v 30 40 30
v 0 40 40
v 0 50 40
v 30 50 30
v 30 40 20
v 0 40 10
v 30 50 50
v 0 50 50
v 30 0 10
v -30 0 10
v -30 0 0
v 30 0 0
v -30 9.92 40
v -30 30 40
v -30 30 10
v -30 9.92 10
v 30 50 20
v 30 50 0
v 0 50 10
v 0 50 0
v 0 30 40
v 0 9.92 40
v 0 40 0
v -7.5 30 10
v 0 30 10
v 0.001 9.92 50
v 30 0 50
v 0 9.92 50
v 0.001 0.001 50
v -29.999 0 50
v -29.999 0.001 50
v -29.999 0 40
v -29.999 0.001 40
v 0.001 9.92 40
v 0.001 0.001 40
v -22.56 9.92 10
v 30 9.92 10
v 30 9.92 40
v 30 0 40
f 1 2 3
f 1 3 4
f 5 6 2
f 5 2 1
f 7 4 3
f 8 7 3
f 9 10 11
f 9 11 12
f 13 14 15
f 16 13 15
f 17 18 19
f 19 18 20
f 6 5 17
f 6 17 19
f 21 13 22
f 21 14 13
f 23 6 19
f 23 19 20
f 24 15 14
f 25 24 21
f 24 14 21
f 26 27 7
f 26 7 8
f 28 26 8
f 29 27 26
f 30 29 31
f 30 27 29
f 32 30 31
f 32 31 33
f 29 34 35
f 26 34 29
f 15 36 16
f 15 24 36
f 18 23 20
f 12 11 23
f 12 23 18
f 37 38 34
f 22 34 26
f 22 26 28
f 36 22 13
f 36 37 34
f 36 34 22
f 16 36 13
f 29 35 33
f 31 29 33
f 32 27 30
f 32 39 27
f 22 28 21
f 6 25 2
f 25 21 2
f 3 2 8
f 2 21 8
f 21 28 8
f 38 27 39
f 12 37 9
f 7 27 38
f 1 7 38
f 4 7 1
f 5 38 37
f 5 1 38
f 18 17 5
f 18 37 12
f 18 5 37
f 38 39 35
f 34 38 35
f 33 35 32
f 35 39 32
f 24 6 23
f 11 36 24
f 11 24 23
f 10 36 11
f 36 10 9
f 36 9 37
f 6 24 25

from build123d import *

# Parameters (mm, degrees)
SKETCH1_W               = 30
SKETCH1_H               = 50
BOSS_EXTRUDE1_DEPTH     = 50
SKETCH2_W               = 30
SKETCH2_H               = 20
BOSS_EXTRUDE2_DEPTH     = 30
SKETCH3_W               = 30
SKETCH3_H               = 20
CUT_EXTRUDE1_DEPTH      = 10
SKETCH4_W               = 30
SKETCH4_H               = 20
BOSS_EXTRUDE3_DEPTH     = 10
SKETCH6_W               = 30
SKETCH6_H               = 50
CUT_EXTRUDE2_DEPTH      = 10
BOSS_EXTRUDE6_DEPTH     = 30
SKETCH10_W              = 30
SKETCH10_H              = 10
BOSS_EXTRUDE8_DEPTH     = 5
SKETCH11_W              = 30
SKETCH11_H              = 10
BOSS_EXTRUDE9_DEPTH     = 5
BOSS_EXTRUDE10_DEPTH    = 10
BOSS_EXTRUDE11_DEPTH    = 10
CUT_EXTRUDE3_DEPTH      = 30
CUT_EXTRUDE3_DEPTH_BACK = 30
SKETCH14_W              = 30
SKETCH14_H              = 10
CUT_EXTRUDE4_DEPTH      = 20
SKETCH19_W              = 36.844767133
SKETCH19_H              = 14.176927822
BOSS_EXTRUDE18_DEPTH    = 10
SKETCH20_W              = 30
SKETCH20_H              = 10
BOSS_EXTRUDE19_DEPTH    = 10
SKETCH22_W              = 36.844767133
SKETCH22_H              = 14.176927822
CUT_EXTRUDE6_DEPTH      = 9.75
SKETCH25_W              = 36.844767133
SKETCH25_H              = 14.176927822
CUT_EXTRUDE14_DEPTH     = 0.12
SKETCH26_W              = 36.844767133
SKETCH26_H              = 14.176927822
CUT_EXTRUDE15_DEPTH     = 0.12
SKETCH29_W              = 36.844767133
SKETCH29_H              = 14.176927822
BOSS_EXTRUDE21_DEPTH    = 0.05
SKETCH31_W              = 60
SKETCH31_H              = 30
BOSS_EXTRUDE25_DEPTH    = 0.08
SKETCH32_W              = 30
SKETCH32_H              = 10
CUT_EXTRUDE22_DEPTH     = 10
SKETCH38_W              = 10
SKETCH38_H              = 9.92
CUT_EXTRUDE26_DEPTH     = 0.001
SKETCH39_W              = 30
SKETCH39_H              = 10
BOSS_EXTRUDE31_DEPTH    = 0.001


with BuildPart() as part:
    # Sketch1 → Boss-Extrude1 (new body)
    with BuildSketch(Plane.XY):
        with Locations((15, 25)):
            Rectangle(SKETCH1_W, SKETCH1_H)
    extrude(amount=BOSS_EXTRUDE1_DEPTH)

    # Sketch2 → Boss-Extrude2 (add)
    with BuildSketch(Plane.XY.offset(50)):
        with Locations((-15, 20)):
            Rectangle(SKETCH2_W, SKETCH2_H)
    extrude(amount=-BOSS_EXTRUDE2_DEPTH)

    # Sketch3 → Cut-Extrude1 (cut)
    with BuildSketch(Plane.XY.offset(50)):
        with Locations((-15, 20)):
            Rectangle(SKETCH3_W, SKETCH3_H)
    extrude(amount=-CUT_EXTRUDE1_DEPTH, mode=Mode.SUBTRACT)

    # Sketch4 → Boss-Extrude3 (add)
    with BuildSketch(Plane(origin=(0, 0, 20), x_dir=(-1, 0, 0), z_dir=(0, 0, -1))):
        with Locations((15, 20)):
            Rectangle(SKETCH4_W, SKETCH4_H)
    extrude(amount=BOSS_EXTRUDE3_DEPTH)

    # Sketch6 → Cut-Extrude2 (cut)
    with BuildSketch(Plane(origin=(0, 50, 0), x_dir=(1, 0, 0), z_dir=(0, 1, 0))):
        with Locations((15, -25)):
            Rectangle(SKETCH6_W, SKETCH6_H)
    extrude(amount=-CUT_EXTRUDE2_DEPTH, mode=Mode.SUBTRACT)

    # Sketch9 → Boss-Extrude6 (add)
    with BuildSketch(Plane.XY.offset(30)):
        Polygon((-30, 0), (0, 0), (0, 40), align=None)
    extrude(amount=-BOSS_EXTRUDE6_DEPTH)

    # Sketch10 → Boss-Extrude8 (add)
    with BuildSketch(Plane.XY.offset(50)):
        with Locations((15, 45)):
            Rectangle(SKETCH10_W, SKETCH10_H)
    extrude(amount=-BOSS_EXTRUDE8_DEPTH)

    # Sketch11 → Boss-Extrude9 (add)
    with BuildSketch(Plane(origin=(0, 0, 45), x_dir=(-1, 0, 0), z_dir=(0, 0, -1))):
        with Locations((-15, 45)):
            Rectangle(SKETCH11_W, SKETCH11_H)
    extrude(amount=BOSS_EXTRUDE9_DEPTH)

    # Sketch12 → Boss-Extrude10 (add)
    with BuildSketch(Plane(origin=(0, 40, 0), x_dir=(1, 0, 0), z_dir=(0, 1, 0))):
        Polygon((0, -40), (30, -30), (30, -40), align=None)
    extrude(amount=BOSS_EXTRUDE10_DEPTH)

    # Sketch13 → Boss-Extrude11 (add)
    with BuildSketch(Plane(origin=(0, 40, 0), x_dir=(1, 0, 0), z_dir=(0, 1, 0))):
        Polygon((0, 0), (30, 0), (30, -20), (0, -10), align=None)
    extrude(amount=BOSS_EXTRUDE11_DEPTH)

    # Sketch14 → Cut-Extrude3 (cut, two sides: drawn at the far end of the back side and taken through both)
    with BuildSketch(Plane(origin=(0, 0, 0), x_dir=(0, 0, -1), z_dir=(1, 0, 0)).offset(-CUT_EXTRUDE3_DEPTH_BACK)):
        with Locations((-25, 5)):
            Rectangle(SKETCH14_W, SKETCH14_H)
    extrude(amount=CUT_EXTRUDE3_DEPTH + CUT_EXTRUDE3_DEPTH_BACK, mode=Mode.SUBTRACT)

    # Sketch15 → Cut-Extrude4 (cut)
    with BuildSketch(Plane.XY.offset(30)):
        Polygon((-7.5, 30), (0, 30), (0, 40), align=None)
    extrude(amount=-CUT_EXTRUDE4_DEPTH, mode=Mode.SUBTRACT)

    # Sketch19 → Boss-Extrude18 (add)
    with BuildSketch(Plane(origin=(0, 10, 0), x_dir=(-1, 0, 0), z_dir=(0, -1, 0))):
        with Locations((11.577616434, -32.911536089)):
            Rectangle(SKETCH19_W, SKETCH19_H)
    extrude(amount=BOSS_EXTRUDE18_DEPTH)

    # Sketch20 → Boss-Extrude19 (add)
    with BuildSketch(Plane.XY.offset(50)):
        with Locations((-15, 5)):
            Rectangle(SKETCH20_W, SKETCH20_H)
    extrude(amount=-BOSS_EXTRUDE19_DEPTH)

    # Sketch22 → Cut-Extrude6 (cut)
    with BuildSketch(Plane(origin=(0, 0, 0), x_dir=(-1, 0, 0), z_dir=(0, -1, 0))):
        with Locations((11.577616434, -32.911536089)):
            Rectangle(SKETCH22_W, SKETCH22_H)
    extrude(amount=-CUT_EXTRUDE6_DEPTH, mode=Mode.SUBTRACT)

    # Sketch25 → Cut-Extrude14 (cut)
    with BuildSketch(Plane(origin=(0, 9.75, 0), x_dir=(-1, 0, 0), z_dir=(0, -1, 0))):
        with Locations((11.577616434, -32.911536089)):
            Rectangle(SKETCH25_W, SKETCH25_H)
    extrude(amount=-CUT_EXTRUDE14_DEPTH, mode=Mode.SUBTRACT)

    # Sketch26 → Cut-Extrude15 (cut)
    with BuildSketch(Plane.XZ.offset(-9.87)):
        with Locations((-11.577616434, 32.911536089)):
            Rectangle(SKETCH26_W, SKETCH26_H)
    extrude(amount=-CUT_EXTRUDE15_DEPTH, mode=Mode.SUBTRACT)

    # Sketch29 → Boss-Extrude21 (add)
    with BuildSketch(Plane.XZ.offset(-10)):
        with Locations((-11.577616434, 32.911536089)):
            Rectangle(SKETCH29_W, SKETCH29_H)
    extrude(amount=BOSS_EXTRUDE21_DEPTH)

    # Sketch31 → Boss-Extrude25 (add)
    with BuildSketch(Plane(origin=(0, 10, 0), x_dir=(-1, 0, 0), z_dir=(0, -1, 0))):
        with Locations((0, -25)):
            Rectangle(SKETCH31_W, SKETCH31_H)
    extrude(amount=BOSS_EXTRUDE25_DEPTH)

    # Sketch32 → Cut-Extrude22 (cut)
    with BuildSketch(Plane.XY.offset(50)):
        with Locations((-15, 5)):
            Rectangle(SKETCH32_W, SKETCH32_H)
    extrude(amount=-CUT_EXTRUDE22_DEPTH, mode=Mode.SUBTRACT)

    # Sketch38 → Cut-Extrude26 (cut)
    with BuildSketch(Plane.ZY):
        with Locations((45, 4.96)):
            Rectangle(SKETCH38_W, SKETCH38_H)
    extrude(amount=-CUT_EXTRUDE26_DEPTH, mode=Mode.SUBTRACT)

    # Sketch39 → Boss-Extrude31 (add)
    with BuildSketch(Plane(origin=(0, 0, 0), x_dir=(-1, 0, 0), z_dir=(0, -1, 0))):
        with Locations((14.999, -45)):
            Rectangle(SKETCH39_W, SKETCH39_H)
    extrude(amount=-BOSS_EXTRUDE31_DEPTH)


solid = part.part
